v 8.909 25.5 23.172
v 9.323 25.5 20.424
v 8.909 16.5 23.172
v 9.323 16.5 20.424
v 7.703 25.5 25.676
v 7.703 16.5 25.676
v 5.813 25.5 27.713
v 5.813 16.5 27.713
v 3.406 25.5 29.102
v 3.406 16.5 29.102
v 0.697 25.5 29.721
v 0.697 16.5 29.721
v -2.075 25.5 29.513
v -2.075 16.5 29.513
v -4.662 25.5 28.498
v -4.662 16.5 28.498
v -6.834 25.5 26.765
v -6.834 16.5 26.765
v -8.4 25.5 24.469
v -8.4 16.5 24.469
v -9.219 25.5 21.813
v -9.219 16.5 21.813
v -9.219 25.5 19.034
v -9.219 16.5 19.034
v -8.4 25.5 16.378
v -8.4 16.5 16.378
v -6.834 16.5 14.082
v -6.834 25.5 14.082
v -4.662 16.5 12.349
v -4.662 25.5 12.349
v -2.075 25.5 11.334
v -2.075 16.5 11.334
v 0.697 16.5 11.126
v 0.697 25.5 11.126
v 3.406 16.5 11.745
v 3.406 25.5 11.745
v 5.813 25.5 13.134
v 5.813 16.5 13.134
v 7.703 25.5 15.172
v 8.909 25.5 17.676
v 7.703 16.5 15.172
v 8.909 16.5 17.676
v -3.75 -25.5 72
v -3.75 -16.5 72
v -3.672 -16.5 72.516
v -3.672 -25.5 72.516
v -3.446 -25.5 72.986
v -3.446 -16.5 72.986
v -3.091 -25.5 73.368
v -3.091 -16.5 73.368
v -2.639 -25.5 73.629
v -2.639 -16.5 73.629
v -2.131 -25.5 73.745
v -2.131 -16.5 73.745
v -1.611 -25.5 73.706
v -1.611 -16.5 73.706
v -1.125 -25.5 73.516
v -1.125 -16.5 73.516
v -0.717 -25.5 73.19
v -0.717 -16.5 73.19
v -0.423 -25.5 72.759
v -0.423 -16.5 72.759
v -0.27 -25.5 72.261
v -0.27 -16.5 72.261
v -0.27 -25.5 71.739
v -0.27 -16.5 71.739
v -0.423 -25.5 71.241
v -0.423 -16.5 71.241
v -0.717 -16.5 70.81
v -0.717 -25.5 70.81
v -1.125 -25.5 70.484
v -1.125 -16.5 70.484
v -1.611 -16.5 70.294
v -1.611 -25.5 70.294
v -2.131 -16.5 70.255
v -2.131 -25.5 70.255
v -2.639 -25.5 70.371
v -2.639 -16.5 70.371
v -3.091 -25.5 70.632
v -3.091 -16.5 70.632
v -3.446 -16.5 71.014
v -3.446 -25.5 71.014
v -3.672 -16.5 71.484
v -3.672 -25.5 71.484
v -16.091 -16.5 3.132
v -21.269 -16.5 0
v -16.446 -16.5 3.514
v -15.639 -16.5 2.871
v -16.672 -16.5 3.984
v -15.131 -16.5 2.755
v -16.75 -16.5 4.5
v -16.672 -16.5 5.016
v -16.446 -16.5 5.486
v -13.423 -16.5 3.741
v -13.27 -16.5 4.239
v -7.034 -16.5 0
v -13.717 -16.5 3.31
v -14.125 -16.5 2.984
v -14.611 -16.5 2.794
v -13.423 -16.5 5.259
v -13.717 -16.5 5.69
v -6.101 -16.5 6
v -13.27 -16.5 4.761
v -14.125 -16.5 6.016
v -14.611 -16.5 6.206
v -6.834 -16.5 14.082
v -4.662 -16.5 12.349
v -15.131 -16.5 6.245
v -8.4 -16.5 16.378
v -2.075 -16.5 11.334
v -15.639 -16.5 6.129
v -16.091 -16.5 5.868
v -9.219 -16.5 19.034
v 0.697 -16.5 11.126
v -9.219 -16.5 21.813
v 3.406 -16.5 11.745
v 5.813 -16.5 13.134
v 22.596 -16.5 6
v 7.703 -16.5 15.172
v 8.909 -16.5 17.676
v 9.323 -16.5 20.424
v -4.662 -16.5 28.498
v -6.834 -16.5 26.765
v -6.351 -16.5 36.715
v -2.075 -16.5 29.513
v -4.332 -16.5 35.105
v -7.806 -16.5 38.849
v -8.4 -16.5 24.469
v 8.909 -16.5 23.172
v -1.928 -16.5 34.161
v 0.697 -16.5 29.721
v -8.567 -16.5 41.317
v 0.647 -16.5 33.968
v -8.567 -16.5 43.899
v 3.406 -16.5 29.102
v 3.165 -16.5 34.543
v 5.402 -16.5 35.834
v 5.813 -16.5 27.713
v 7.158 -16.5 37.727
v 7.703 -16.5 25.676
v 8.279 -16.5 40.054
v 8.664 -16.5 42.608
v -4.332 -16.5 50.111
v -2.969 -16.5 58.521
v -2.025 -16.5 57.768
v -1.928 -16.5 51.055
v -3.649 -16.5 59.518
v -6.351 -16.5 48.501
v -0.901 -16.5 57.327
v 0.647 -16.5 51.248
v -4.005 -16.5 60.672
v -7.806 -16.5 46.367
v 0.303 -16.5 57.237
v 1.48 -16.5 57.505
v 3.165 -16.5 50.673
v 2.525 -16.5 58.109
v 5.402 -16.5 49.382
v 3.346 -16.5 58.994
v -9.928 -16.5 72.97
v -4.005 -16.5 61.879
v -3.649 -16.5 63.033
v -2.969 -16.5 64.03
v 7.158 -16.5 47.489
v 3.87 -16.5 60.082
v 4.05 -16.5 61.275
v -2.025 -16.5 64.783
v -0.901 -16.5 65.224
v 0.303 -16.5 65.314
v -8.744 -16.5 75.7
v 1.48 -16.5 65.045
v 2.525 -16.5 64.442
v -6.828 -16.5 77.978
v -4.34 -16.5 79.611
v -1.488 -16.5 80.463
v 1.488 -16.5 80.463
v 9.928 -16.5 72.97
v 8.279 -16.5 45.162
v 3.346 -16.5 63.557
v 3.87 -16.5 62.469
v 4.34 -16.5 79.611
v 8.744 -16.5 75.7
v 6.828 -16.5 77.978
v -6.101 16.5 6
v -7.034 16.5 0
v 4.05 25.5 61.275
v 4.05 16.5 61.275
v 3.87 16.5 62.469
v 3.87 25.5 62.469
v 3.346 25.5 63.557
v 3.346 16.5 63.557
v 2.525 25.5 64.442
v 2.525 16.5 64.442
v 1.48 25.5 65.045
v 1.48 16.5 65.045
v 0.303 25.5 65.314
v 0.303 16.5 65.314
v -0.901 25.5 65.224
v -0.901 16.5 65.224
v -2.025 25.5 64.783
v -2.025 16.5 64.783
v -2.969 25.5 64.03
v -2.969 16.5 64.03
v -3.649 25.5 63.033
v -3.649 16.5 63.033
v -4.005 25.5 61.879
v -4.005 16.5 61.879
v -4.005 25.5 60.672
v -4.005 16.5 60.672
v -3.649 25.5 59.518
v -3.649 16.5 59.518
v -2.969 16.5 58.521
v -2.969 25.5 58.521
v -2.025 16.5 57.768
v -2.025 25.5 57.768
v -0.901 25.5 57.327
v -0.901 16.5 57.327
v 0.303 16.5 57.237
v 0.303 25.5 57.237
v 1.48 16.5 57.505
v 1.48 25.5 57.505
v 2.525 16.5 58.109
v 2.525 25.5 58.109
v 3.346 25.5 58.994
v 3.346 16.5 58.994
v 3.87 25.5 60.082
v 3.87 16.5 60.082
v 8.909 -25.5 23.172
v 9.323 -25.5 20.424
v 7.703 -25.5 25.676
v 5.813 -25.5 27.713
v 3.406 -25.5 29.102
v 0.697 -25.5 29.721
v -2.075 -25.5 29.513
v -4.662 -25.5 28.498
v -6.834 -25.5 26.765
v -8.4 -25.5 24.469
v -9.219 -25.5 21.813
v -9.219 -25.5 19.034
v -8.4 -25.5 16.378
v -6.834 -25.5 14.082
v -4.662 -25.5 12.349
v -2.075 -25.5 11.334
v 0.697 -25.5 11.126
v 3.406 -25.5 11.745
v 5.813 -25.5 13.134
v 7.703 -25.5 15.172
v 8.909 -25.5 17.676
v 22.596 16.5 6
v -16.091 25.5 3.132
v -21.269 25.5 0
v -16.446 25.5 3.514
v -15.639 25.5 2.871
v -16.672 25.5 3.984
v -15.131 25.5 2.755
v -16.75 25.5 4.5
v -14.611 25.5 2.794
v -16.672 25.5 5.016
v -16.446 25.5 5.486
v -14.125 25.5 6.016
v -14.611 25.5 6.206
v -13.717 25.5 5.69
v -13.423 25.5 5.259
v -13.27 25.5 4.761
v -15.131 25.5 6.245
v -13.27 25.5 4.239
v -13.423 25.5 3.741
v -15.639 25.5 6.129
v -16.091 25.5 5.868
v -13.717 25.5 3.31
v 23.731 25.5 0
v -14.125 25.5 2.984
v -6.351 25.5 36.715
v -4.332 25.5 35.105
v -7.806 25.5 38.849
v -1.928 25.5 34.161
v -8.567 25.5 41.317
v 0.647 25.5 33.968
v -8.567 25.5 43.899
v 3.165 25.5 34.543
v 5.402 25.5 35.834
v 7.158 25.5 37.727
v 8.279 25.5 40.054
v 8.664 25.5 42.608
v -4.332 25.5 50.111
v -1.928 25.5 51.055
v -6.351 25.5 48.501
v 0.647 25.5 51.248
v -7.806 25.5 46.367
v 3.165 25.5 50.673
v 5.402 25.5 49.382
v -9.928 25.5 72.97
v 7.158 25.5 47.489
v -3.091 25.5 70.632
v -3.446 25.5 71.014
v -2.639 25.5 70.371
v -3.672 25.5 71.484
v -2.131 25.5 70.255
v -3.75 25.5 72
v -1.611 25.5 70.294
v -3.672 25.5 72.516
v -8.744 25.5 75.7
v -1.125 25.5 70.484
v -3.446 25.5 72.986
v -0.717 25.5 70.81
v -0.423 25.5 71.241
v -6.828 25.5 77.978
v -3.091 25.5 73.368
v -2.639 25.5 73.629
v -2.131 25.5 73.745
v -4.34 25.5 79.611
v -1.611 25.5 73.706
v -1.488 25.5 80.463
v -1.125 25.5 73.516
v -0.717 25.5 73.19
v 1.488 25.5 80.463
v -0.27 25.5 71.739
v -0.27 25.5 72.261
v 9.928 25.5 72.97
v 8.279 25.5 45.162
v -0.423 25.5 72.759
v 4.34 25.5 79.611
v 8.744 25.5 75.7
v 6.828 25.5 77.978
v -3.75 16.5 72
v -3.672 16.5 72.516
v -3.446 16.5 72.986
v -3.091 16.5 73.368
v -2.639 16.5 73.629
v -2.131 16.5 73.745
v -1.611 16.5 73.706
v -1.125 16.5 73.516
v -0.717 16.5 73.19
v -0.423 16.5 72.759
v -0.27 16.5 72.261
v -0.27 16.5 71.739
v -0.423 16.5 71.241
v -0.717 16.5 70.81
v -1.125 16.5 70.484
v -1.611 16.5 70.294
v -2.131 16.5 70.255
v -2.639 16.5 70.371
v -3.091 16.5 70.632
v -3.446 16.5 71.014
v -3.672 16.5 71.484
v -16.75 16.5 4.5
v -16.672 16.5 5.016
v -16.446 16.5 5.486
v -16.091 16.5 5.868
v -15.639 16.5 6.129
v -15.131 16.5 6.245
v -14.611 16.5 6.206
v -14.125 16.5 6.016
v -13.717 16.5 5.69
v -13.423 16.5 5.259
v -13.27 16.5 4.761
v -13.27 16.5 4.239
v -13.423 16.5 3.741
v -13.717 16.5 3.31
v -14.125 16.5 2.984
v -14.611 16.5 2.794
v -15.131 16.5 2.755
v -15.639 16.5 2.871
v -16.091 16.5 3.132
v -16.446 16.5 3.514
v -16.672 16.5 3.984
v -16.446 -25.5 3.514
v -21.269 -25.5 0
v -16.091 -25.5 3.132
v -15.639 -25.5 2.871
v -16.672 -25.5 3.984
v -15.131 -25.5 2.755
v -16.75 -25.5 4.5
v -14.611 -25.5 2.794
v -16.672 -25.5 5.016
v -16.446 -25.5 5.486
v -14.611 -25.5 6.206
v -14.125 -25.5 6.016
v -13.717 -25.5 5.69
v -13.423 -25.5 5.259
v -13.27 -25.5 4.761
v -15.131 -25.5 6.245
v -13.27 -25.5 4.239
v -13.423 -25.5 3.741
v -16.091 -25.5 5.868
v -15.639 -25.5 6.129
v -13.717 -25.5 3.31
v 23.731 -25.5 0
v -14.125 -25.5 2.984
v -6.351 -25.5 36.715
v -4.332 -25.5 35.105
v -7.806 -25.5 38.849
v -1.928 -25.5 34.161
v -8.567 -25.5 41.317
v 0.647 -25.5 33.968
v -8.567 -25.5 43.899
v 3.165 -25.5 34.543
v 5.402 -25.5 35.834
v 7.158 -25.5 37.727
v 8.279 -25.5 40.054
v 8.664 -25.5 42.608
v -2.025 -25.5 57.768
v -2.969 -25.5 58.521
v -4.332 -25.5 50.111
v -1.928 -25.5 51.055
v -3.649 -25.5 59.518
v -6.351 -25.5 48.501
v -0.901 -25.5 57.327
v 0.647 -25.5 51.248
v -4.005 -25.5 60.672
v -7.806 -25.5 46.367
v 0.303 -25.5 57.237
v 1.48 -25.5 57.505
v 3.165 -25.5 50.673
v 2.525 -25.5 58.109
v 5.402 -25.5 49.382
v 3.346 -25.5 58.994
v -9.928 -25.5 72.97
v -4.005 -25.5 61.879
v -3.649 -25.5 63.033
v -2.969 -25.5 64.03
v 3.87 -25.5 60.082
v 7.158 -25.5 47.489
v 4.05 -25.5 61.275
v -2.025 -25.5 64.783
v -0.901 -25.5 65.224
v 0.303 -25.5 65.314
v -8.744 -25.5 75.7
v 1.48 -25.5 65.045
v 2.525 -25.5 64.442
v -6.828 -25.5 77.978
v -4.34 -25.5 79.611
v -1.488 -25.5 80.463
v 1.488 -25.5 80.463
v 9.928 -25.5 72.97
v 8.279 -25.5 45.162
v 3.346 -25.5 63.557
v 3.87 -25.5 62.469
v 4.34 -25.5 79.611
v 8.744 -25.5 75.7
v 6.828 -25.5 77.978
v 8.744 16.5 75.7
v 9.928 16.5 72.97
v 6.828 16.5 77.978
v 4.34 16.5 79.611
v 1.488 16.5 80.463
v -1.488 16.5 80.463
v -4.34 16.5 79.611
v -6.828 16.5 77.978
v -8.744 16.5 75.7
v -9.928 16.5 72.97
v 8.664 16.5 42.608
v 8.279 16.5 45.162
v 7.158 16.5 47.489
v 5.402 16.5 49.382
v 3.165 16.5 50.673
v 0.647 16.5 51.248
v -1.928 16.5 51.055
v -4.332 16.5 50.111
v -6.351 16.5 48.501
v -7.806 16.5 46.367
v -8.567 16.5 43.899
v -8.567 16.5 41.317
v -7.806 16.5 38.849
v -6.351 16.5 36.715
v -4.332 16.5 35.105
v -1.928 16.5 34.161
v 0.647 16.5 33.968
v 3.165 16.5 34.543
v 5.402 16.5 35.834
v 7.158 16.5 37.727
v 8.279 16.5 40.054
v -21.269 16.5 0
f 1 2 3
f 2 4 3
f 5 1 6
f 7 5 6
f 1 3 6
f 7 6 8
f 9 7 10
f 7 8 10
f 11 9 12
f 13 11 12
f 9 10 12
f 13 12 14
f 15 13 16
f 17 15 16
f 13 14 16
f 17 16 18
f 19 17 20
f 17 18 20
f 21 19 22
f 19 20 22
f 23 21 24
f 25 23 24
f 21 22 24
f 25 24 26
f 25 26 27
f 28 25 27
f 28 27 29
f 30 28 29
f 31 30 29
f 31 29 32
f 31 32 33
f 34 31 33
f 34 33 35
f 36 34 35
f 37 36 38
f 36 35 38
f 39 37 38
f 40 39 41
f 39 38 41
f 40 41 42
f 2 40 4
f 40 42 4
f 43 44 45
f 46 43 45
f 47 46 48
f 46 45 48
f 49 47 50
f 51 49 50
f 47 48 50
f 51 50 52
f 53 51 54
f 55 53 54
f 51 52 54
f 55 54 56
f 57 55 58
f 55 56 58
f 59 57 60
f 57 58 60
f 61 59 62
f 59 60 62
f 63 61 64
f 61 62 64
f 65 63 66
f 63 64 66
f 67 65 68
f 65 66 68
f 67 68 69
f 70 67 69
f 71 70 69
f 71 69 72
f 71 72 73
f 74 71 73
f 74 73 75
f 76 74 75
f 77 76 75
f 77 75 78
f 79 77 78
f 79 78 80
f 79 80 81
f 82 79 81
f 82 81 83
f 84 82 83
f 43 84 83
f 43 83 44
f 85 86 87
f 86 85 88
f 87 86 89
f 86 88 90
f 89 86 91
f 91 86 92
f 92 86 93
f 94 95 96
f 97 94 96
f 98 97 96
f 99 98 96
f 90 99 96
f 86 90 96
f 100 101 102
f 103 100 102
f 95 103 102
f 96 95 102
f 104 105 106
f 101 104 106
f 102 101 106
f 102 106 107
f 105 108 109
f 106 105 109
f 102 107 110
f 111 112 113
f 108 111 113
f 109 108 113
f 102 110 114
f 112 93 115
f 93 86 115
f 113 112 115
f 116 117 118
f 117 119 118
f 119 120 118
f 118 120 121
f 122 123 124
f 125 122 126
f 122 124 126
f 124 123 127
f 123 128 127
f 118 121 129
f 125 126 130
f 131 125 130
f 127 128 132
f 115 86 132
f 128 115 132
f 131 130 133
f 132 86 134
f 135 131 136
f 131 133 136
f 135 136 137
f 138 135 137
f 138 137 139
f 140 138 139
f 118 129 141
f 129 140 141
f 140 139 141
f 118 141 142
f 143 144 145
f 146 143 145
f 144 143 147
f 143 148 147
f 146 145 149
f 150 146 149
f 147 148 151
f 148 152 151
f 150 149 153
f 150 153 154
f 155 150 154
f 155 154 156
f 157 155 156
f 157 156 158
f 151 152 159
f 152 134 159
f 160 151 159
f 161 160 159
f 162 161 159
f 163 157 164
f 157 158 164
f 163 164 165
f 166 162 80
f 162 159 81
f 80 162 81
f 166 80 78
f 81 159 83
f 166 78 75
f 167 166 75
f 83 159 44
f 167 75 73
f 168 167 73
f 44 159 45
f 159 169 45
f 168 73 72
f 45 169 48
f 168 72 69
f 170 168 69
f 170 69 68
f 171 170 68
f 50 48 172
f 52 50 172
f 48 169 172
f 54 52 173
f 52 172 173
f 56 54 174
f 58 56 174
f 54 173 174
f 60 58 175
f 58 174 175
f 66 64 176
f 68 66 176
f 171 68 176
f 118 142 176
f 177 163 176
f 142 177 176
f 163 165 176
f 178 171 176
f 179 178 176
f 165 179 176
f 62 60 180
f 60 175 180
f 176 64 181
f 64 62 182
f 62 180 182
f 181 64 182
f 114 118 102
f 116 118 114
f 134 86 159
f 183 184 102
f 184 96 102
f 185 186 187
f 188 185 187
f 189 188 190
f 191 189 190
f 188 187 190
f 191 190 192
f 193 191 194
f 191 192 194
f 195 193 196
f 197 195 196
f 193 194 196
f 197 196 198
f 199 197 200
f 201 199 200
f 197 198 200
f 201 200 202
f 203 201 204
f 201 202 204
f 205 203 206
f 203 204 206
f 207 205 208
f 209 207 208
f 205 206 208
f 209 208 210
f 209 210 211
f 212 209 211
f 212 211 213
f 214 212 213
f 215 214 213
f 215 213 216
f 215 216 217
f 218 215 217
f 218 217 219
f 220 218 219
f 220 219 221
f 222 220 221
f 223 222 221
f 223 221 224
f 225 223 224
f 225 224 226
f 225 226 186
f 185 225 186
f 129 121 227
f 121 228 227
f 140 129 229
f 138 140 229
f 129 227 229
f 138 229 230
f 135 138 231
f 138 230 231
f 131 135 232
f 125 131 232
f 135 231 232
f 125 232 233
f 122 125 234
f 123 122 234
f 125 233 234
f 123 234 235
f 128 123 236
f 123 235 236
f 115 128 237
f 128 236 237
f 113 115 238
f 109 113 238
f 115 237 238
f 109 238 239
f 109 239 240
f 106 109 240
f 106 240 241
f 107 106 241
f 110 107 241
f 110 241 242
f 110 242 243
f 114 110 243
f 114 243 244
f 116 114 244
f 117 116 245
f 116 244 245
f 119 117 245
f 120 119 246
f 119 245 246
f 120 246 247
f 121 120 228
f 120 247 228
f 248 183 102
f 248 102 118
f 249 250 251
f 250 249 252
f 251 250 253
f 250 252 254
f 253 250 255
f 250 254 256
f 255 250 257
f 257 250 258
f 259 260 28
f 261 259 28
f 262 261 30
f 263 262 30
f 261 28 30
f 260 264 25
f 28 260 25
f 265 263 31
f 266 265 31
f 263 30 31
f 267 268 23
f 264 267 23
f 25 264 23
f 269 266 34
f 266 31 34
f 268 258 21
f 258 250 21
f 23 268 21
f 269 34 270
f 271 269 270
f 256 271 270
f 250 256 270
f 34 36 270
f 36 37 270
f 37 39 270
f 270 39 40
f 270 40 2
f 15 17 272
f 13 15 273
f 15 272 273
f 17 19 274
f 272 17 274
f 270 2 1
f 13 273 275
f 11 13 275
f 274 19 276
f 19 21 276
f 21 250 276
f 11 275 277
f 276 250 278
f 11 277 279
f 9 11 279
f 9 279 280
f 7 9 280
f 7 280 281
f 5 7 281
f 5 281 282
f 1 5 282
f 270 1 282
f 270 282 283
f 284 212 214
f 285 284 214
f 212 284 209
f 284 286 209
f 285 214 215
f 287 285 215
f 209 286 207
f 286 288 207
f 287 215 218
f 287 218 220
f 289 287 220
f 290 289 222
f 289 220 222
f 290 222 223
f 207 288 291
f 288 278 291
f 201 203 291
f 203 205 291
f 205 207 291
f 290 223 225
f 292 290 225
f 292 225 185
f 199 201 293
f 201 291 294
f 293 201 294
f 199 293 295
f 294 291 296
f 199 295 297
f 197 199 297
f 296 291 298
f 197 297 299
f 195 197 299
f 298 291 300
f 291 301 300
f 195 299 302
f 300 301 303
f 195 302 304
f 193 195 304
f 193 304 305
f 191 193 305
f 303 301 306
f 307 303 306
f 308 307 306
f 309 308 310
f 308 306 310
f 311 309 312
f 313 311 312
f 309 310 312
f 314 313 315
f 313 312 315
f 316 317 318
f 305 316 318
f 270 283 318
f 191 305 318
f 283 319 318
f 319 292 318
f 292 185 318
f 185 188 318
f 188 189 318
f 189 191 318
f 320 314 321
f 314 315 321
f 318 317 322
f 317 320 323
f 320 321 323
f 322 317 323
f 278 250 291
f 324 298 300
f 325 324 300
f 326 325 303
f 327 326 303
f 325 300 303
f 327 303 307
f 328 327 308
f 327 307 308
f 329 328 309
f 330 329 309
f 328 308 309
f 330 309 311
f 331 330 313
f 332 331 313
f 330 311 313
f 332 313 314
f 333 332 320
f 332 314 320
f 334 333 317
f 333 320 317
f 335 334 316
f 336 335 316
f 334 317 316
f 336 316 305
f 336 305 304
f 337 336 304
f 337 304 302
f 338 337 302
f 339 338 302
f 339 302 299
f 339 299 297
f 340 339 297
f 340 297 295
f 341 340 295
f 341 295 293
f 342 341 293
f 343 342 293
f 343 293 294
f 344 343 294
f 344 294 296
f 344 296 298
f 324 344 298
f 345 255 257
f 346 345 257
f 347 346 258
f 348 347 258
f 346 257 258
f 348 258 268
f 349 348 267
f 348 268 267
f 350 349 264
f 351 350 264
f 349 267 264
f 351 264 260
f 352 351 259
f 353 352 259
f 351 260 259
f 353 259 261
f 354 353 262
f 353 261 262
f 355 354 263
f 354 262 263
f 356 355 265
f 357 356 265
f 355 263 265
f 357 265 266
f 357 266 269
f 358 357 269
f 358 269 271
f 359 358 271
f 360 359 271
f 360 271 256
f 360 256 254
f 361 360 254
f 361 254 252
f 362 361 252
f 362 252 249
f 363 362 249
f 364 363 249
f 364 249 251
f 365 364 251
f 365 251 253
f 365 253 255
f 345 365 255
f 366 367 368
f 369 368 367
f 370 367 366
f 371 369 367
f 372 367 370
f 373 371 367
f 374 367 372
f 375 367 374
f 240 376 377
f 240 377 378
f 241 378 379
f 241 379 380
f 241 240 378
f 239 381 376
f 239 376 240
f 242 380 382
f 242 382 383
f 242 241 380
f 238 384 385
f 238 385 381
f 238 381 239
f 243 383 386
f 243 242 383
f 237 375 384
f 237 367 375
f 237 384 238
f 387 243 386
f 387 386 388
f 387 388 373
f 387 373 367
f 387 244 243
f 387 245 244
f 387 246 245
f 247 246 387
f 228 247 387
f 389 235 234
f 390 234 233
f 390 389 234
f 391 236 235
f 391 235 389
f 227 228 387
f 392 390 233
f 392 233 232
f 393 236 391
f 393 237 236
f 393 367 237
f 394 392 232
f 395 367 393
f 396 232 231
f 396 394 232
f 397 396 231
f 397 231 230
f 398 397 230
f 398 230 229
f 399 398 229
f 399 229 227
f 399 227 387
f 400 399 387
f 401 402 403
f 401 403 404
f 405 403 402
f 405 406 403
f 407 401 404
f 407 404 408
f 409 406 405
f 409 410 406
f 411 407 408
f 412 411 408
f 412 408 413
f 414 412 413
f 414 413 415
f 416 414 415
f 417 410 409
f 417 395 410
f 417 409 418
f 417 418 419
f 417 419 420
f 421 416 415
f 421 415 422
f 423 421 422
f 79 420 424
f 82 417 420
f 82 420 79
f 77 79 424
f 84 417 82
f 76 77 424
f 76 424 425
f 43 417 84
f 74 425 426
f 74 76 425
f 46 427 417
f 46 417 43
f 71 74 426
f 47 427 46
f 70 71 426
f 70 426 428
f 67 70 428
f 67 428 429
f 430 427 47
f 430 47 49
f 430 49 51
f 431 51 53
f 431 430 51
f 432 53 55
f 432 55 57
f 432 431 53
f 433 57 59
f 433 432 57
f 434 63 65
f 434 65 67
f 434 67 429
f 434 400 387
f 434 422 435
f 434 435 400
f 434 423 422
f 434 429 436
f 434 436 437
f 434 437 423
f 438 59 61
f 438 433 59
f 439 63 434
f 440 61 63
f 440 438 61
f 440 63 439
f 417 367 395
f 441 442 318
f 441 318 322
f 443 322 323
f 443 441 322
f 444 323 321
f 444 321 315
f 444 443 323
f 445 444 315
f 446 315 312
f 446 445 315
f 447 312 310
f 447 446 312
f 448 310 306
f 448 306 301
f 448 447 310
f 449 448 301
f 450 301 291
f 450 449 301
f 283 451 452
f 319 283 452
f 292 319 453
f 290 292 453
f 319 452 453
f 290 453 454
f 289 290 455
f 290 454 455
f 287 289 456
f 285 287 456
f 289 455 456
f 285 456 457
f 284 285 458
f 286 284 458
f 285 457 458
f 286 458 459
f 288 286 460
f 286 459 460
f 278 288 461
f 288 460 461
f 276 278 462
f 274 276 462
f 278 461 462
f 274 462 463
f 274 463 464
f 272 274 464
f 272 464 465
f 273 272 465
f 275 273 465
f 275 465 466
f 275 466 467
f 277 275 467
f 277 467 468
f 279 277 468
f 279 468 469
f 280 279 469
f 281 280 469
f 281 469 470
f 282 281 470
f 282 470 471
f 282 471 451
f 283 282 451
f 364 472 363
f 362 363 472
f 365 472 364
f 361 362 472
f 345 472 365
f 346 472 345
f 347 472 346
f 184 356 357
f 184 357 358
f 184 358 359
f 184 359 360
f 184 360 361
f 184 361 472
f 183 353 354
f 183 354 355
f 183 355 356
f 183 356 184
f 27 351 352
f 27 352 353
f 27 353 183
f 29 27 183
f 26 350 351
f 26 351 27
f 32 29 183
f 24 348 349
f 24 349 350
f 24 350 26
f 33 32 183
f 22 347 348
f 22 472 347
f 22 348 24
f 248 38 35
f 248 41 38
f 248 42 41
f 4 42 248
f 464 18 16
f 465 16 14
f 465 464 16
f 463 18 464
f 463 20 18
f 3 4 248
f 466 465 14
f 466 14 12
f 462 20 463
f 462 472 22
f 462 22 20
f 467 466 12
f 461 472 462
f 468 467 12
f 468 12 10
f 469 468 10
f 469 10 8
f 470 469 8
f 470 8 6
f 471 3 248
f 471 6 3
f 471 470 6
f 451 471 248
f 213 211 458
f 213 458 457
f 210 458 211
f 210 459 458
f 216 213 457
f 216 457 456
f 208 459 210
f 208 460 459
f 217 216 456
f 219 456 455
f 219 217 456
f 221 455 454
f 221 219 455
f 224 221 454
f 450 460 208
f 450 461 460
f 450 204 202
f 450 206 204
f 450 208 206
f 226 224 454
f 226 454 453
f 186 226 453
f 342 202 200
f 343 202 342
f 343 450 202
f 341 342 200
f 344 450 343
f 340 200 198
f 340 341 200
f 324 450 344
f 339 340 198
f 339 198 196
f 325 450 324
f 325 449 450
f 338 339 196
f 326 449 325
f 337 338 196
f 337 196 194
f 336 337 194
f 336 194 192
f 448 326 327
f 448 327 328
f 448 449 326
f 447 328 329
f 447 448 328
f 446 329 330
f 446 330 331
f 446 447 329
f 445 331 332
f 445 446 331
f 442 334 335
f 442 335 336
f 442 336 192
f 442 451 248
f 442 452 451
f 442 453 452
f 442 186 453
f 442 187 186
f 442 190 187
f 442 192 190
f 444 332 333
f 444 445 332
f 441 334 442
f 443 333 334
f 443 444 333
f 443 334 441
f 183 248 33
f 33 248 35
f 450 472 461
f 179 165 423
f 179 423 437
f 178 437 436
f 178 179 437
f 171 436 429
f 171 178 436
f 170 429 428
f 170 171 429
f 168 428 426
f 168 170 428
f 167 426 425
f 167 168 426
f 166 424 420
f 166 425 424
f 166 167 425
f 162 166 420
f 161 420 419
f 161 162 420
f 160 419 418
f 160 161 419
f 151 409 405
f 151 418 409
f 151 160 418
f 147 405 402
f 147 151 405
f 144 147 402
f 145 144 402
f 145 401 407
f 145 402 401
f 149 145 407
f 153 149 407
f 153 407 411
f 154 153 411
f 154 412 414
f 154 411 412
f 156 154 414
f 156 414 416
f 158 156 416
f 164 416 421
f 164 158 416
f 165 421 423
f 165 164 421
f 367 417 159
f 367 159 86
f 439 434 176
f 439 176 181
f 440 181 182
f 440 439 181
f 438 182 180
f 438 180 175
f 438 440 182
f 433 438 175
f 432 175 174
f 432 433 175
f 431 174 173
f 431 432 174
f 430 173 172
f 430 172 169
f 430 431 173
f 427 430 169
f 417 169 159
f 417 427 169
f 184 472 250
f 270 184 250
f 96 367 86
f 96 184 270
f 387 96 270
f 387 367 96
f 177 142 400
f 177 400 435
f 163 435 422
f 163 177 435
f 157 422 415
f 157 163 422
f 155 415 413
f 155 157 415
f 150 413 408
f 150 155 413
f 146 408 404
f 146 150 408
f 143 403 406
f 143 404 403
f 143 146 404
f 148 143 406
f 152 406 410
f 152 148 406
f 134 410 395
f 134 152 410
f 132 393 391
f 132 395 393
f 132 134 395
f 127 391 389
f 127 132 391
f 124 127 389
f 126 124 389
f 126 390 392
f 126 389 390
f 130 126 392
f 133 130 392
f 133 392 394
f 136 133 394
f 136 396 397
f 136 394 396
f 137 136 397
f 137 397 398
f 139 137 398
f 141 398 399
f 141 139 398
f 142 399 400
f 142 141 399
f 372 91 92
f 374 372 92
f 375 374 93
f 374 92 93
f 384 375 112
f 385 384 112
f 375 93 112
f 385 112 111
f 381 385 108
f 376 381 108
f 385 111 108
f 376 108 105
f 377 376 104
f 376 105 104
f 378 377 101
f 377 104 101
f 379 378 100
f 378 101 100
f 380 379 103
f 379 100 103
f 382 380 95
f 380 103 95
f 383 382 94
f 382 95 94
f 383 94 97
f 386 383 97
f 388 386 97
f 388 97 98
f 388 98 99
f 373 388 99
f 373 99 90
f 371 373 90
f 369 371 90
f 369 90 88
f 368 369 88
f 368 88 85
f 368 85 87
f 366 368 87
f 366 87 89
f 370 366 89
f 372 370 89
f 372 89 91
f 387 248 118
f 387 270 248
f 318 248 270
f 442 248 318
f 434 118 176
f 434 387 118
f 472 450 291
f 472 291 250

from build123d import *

# Parameters (mm, degrees)
F1_DEPTH = 25.5
F3_DEPTH = 16.5
F6_D     = 3.5
F7_R     = 8.663852
F7_R_2   = 4.05
F7_R_3   = 9.323293
F8_DEPTH = 40


with BuildPart() as f1:
    # F0 (on Front) → F1 (new body, symmetric)
    with BuildSketch(Plane.XZ):
        with BuildLine():
            Line((-21.26926, 0), (23.73074, 0))
            Line((23.73074, 0), (9.928151, 72.969893))
            ThreePointArc((9.928151, 72.969893), (0, 80.571183), (-9.928151, 72.969893))
            Line((-9.928151, 72.969893), (-21.26926, 0))
        make_face()
    extrude(amount=F1_DEPTH, both=True)


with BuildPart() as f3:
    # F2 (on Front) → F3 (new body, symmetric)
    with BuildSketch(Plane.XZ):
        Polygon((-6.10114, 6), (30, 6), (20, 90), (-30, 90), (-30, 0), (-7.03367, 0), align=None)
    extrude(amount=F3_DEPTH, both=True)


with BuildPart() as f1_1:
    add(f1.part)

    # F4: cut F3
    add(f3.part, mode=Mode.SUBTRACT)

    # F6 (through all)
    with Locations(Plane.XZ.offset(25.5)):
        with Locations((-2, 72), (-15, 4.5)):
            Hole(F6_D / 2)


with BuildPart() as f8:
    # F7 (on Front) → F8 (new body, symmetric)
    with BuildSketch(Plane.XZ):
        with Locations((0, 42.608014)):
            Circle(F7_R)
        with Locations((0, 61.275356)):
            Circle(F7_R_2)
        with Locations((0, 20.42364)):
            Circle(F7_R_3)
    extrude(amount=F8_DEPTH, both=True)


with BuildPart() as f1_2:
    add(f1_1.part)

    # F9: cut F8
    add(f8.part, mode=Mode.SUBTRACT)


solid = f1_2.part
